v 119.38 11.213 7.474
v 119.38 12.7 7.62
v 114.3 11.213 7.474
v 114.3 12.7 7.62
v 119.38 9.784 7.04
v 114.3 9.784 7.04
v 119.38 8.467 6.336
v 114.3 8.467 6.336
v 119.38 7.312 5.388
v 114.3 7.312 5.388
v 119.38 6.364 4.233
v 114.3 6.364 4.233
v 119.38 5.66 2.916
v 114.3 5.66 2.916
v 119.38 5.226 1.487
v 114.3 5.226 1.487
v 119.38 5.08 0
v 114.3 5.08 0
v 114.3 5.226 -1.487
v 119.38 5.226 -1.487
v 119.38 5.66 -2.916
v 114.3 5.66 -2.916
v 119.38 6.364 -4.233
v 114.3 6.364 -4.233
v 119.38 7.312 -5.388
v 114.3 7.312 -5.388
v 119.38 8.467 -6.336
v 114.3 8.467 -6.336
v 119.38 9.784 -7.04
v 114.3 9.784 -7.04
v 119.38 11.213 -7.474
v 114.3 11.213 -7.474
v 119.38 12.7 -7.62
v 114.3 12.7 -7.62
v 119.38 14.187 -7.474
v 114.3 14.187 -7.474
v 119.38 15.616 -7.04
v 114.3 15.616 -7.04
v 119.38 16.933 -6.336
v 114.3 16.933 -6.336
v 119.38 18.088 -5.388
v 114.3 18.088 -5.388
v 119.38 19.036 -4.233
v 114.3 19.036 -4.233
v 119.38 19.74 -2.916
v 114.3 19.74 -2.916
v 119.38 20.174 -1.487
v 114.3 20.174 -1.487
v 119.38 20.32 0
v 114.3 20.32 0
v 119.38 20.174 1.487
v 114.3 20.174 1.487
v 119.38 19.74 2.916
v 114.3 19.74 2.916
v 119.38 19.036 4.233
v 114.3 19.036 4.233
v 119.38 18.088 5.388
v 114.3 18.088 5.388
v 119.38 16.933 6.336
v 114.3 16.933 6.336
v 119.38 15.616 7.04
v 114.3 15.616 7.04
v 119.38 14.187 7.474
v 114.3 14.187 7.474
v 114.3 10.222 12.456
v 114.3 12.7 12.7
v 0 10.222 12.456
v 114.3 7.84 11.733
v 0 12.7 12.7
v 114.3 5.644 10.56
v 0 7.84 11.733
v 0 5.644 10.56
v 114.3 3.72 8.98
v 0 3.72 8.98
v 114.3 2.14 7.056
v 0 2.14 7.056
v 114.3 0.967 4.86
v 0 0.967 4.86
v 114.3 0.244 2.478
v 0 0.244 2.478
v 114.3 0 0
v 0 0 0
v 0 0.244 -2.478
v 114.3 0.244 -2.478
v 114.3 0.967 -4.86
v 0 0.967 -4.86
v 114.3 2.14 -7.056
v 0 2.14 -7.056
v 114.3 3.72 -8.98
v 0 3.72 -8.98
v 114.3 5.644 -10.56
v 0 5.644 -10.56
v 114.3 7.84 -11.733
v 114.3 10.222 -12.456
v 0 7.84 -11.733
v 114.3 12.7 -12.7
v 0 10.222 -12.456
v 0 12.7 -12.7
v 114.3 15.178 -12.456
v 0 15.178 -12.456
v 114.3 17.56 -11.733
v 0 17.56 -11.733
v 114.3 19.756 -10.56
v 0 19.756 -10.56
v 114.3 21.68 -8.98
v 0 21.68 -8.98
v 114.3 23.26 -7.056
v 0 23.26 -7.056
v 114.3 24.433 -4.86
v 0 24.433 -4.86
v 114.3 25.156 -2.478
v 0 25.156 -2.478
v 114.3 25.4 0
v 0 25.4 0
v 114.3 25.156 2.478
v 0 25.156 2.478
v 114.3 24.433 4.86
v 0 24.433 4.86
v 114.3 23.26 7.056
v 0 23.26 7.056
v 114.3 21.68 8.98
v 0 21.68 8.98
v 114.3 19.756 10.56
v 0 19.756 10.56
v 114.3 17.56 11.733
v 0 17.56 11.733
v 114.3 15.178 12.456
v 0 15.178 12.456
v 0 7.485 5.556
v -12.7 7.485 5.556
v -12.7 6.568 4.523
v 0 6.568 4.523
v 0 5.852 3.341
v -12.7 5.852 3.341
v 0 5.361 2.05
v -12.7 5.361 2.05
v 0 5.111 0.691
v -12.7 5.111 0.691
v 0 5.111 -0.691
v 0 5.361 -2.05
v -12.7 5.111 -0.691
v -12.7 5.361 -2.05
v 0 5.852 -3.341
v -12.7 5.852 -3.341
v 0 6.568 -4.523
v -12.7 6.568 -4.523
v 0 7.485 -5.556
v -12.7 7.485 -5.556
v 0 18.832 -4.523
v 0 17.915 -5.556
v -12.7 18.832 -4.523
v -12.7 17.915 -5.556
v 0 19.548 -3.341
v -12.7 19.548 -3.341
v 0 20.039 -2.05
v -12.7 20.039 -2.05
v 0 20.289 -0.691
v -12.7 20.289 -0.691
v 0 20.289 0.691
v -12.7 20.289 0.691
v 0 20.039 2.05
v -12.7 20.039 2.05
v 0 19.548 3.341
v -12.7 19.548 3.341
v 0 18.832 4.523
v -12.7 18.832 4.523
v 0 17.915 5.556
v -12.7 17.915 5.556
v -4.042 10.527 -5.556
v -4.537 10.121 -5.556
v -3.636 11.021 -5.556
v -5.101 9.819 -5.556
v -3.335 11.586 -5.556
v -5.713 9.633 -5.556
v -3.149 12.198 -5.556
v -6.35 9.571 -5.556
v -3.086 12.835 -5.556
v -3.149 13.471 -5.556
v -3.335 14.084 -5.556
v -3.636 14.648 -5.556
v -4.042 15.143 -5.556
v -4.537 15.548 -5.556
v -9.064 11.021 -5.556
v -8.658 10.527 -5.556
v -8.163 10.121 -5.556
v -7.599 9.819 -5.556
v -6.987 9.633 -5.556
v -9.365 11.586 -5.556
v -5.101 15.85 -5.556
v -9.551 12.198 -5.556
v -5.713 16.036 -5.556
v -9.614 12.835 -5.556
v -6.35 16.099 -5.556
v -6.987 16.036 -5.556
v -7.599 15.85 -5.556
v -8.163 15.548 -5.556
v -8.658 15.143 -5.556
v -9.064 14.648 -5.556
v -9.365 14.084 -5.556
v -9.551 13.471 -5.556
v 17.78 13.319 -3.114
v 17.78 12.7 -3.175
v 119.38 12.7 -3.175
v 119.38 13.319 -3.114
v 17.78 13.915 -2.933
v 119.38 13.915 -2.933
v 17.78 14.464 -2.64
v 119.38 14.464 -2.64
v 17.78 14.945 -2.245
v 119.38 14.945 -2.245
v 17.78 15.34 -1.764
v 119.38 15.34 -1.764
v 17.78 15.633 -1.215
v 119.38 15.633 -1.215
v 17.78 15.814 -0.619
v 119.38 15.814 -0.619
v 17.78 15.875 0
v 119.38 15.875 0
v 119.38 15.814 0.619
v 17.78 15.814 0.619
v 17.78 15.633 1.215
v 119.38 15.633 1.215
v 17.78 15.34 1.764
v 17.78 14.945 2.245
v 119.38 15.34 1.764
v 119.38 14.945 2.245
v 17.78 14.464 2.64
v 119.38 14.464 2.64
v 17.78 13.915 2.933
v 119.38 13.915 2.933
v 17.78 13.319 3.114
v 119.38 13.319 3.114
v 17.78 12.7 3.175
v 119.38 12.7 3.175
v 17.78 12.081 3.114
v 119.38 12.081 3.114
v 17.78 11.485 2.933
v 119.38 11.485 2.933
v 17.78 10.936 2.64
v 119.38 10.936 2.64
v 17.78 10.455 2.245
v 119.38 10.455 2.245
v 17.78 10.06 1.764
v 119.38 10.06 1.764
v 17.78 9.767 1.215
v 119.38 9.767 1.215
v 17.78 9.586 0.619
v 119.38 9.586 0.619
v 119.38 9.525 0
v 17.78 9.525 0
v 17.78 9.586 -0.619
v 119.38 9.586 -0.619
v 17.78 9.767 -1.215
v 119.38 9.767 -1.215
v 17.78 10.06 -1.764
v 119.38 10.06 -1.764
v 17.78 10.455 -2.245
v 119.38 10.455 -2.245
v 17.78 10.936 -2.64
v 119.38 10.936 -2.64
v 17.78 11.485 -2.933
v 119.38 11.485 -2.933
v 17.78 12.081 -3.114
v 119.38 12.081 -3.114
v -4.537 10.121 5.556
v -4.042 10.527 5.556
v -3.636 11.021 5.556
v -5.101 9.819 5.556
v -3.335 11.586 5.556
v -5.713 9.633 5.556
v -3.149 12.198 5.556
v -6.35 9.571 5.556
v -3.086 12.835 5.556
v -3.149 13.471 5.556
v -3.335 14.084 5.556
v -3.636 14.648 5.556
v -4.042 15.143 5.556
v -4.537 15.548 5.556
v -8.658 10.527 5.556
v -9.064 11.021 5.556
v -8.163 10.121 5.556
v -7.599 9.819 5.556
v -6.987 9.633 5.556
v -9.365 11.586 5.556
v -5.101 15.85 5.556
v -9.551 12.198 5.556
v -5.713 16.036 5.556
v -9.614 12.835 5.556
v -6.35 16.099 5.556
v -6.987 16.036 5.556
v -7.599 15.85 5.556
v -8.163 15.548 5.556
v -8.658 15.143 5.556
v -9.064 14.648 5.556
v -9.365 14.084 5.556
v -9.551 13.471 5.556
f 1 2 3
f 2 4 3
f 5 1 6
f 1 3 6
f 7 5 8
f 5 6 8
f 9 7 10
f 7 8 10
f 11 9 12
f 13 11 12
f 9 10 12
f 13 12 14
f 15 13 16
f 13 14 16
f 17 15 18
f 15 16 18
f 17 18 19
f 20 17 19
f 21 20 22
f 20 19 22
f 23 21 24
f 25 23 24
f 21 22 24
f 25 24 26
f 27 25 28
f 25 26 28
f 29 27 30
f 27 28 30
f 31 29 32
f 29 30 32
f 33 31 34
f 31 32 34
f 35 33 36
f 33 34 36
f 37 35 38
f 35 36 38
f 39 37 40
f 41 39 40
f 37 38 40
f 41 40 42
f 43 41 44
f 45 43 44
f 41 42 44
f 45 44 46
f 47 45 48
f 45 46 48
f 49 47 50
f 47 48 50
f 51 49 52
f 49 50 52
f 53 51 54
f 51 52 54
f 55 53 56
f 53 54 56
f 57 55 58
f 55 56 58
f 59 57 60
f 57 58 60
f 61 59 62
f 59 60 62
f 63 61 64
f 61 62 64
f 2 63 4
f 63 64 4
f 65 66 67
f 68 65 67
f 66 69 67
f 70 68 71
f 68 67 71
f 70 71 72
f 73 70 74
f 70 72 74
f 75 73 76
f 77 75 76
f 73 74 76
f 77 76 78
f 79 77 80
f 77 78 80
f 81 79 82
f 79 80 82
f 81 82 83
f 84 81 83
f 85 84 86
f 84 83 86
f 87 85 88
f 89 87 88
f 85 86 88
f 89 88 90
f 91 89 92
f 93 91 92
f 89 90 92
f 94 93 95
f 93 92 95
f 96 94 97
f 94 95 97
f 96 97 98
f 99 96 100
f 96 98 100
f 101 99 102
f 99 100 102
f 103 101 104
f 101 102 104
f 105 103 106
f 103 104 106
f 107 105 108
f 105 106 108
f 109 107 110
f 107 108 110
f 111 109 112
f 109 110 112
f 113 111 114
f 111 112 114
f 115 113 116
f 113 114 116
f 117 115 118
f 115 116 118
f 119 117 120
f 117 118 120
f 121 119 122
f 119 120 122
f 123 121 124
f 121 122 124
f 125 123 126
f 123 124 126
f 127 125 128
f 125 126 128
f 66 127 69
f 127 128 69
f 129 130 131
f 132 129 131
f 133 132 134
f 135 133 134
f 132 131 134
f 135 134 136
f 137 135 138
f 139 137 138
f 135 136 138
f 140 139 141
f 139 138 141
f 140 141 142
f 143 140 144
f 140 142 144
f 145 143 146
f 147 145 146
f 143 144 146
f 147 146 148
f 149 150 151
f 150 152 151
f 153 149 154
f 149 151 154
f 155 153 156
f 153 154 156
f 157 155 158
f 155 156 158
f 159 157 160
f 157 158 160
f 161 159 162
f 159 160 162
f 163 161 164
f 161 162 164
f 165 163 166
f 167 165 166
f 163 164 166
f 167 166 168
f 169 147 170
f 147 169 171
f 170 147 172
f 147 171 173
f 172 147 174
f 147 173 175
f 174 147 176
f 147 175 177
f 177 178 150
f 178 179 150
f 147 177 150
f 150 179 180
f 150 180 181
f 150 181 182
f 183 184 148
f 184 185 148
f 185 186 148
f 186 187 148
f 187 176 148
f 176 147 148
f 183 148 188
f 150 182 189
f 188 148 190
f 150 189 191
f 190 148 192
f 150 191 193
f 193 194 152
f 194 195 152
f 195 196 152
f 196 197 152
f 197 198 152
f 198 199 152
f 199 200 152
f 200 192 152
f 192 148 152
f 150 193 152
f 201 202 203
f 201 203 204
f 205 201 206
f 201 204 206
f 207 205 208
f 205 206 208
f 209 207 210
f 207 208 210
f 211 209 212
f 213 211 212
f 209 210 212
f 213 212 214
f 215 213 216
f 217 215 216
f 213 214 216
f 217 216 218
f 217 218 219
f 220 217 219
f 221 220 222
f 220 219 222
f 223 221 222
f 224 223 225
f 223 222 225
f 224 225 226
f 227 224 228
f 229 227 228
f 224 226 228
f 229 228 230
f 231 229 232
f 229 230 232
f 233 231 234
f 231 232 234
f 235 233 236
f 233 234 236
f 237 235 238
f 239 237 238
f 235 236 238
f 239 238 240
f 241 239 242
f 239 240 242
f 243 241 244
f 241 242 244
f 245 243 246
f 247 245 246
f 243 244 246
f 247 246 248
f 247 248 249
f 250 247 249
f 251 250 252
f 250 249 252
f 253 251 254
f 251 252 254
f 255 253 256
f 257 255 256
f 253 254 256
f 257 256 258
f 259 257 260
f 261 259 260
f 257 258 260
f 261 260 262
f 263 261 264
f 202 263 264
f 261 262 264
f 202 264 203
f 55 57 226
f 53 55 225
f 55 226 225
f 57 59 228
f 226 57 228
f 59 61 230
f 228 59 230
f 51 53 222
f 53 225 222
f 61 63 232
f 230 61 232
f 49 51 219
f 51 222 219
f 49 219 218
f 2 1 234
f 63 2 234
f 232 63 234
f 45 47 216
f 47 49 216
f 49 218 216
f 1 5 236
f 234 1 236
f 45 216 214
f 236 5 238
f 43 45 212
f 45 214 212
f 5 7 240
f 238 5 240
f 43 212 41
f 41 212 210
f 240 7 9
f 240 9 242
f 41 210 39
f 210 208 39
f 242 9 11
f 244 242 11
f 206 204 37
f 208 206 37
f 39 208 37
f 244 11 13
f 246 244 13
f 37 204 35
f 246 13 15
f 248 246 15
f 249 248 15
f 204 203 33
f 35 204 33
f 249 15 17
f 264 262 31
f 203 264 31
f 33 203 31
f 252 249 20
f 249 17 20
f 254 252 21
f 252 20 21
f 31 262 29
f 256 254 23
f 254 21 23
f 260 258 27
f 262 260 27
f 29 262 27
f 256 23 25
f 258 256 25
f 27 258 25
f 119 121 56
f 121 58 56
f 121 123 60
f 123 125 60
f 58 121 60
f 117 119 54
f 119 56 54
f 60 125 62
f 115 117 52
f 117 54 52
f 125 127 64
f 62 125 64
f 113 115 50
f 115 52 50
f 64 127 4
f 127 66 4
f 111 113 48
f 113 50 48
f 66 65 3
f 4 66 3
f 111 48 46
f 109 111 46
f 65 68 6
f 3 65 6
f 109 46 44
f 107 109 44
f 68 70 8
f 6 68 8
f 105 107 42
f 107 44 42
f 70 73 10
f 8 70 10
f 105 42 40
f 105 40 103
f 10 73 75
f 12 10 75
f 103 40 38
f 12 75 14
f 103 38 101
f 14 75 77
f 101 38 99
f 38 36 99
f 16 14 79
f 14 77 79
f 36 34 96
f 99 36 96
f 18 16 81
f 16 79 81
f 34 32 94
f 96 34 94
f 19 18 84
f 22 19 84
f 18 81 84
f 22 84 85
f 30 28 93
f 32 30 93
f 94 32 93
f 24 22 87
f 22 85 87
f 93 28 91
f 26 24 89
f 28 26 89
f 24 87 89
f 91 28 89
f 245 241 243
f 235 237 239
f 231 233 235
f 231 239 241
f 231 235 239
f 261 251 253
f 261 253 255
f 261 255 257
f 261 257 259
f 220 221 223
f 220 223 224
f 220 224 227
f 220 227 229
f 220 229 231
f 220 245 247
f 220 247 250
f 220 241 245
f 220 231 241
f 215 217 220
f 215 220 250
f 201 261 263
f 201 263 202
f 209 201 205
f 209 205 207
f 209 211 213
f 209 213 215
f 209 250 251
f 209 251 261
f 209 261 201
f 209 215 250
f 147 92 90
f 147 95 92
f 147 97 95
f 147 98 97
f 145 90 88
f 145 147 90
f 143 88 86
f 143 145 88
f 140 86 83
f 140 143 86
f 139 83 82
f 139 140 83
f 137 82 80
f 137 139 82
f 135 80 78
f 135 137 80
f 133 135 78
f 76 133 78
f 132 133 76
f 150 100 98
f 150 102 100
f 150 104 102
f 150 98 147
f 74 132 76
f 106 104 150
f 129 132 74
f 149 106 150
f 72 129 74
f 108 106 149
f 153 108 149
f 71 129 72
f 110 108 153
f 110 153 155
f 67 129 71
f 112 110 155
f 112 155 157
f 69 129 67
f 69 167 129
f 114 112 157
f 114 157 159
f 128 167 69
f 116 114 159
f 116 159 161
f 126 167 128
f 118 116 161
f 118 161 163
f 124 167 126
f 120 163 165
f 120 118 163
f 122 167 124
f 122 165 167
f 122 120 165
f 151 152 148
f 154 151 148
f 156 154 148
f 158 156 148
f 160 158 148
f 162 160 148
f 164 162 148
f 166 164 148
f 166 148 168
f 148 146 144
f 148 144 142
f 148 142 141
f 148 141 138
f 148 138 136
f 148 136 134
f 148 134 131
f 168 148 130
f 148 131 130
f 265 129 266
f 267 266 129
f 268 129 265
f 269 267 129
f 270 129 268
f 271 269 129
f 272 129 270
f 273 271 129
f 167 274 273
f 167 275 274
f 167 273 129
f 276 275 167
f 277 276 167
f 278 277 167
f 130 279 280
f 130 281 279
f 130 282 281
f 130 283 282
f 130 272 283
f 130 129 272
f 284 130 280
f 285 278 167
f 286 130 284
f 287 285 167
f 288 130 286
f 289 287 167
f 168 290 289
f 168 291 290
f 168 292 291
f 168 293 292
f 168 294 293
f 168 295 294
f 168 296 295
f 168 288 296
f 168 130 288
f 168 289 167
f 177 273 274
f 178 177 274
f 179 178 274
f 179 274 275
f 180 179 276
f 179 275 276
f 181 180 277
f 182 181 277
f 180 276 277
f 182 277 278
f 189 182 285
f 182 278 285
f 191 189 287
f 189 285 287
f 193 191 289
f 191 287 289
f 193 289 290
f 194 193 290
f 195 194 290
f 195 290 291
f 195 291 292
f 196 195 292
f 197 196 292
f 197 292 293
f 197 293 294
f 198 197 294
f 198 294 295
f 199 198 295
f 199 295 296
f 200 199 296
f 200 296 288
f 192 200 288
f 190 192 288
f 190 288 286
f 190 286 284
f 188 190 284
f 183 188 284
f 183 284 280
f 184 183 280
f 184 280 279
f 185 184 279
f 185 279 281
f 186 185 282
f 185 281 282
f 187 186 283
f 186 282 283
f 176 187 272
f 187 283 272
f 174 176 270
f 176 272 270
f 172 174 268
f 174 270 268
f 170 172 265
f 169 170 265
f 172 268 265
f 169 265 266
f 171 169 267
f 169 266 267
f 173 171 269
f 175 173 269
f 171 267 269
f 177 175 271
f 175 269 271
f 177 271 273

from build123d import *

# Parameters (mm, degrees)
SKETCH2_R          = 3.175
CUT_EXTRUDE1_DEPTH = 101.6
SKETCH3_W          = 2.54
SKETCH3_H          = 14.827996595
SKETCH3_H_2        = 14.256172231
CUT_EXTRUDE2_DEPTH = 12.7
SKETCH4_R          = 3.2639
CUT_EXTRUDE3_DEPTH = 124.410028215


with BuildPart() as part:
    # Sketch1 → Revolve2 (revolve)
    with BuildSketch(Plane.XY, mode=Mode.PRIVATE) as revolve2_sk:
        Polygon((-12.7, 20.32), (-12.7, 12.7), (119.38, 12.7), (119.38, 20.32), (114.3, 20.32), (114.3, 25.4), (0, 25.4), (0, 20.32), align=None)
    revolve(revolve2_sk.sketch.rotate(Axis((-12.7, 12.7, 0), (1, 0, 0)), 90), axis=Axis((-12.7, 12.7, 0), (1, 0, 0)))

    # Sketch2 → Cut-Extrude1 (cut)
    with BuildSketch(Plane(origin=(119.38, 0, 0), x_dir=(0, 0, -1), z_dir=(1, 0, 0))):
        with Locations((0, 12.7)):
            Circle(SKETCH2_R)
    extrude(amount=-CUT_EXTRUDE1_DEPTH, mode=Mode.SUBTRACT)

    # Sketch3 → Cut-Extrude2 (cut)
    with BuildSketch(Plane.ZY.offset(12.7)):
        with Locations((-6.82625, 12.906001702)):
            Rectangle(SKETCH3_W, SKETCH3_H)
        with Locations((6.82625, 13.191913884)):
            Rectangle(SKETCH3_W, SKETCH3_H_2)
    extrude(amount=-CUT_EXTRUDE2_DEPTH, mode=Mode.SUBTRACT)

    # Sketch4 → Cut-Extrude3 (cut, through all)
    with BuildSketch(Plane.XY.offset(5.55625)):
        with Locations((-6.35, 12.834641497)):
            Circle(SKETCH4_R)
    extrude(amount=-CUT_EXTRUDE3_DEPTH, mode=Mode.SUBTRACT)


solid = part.part
